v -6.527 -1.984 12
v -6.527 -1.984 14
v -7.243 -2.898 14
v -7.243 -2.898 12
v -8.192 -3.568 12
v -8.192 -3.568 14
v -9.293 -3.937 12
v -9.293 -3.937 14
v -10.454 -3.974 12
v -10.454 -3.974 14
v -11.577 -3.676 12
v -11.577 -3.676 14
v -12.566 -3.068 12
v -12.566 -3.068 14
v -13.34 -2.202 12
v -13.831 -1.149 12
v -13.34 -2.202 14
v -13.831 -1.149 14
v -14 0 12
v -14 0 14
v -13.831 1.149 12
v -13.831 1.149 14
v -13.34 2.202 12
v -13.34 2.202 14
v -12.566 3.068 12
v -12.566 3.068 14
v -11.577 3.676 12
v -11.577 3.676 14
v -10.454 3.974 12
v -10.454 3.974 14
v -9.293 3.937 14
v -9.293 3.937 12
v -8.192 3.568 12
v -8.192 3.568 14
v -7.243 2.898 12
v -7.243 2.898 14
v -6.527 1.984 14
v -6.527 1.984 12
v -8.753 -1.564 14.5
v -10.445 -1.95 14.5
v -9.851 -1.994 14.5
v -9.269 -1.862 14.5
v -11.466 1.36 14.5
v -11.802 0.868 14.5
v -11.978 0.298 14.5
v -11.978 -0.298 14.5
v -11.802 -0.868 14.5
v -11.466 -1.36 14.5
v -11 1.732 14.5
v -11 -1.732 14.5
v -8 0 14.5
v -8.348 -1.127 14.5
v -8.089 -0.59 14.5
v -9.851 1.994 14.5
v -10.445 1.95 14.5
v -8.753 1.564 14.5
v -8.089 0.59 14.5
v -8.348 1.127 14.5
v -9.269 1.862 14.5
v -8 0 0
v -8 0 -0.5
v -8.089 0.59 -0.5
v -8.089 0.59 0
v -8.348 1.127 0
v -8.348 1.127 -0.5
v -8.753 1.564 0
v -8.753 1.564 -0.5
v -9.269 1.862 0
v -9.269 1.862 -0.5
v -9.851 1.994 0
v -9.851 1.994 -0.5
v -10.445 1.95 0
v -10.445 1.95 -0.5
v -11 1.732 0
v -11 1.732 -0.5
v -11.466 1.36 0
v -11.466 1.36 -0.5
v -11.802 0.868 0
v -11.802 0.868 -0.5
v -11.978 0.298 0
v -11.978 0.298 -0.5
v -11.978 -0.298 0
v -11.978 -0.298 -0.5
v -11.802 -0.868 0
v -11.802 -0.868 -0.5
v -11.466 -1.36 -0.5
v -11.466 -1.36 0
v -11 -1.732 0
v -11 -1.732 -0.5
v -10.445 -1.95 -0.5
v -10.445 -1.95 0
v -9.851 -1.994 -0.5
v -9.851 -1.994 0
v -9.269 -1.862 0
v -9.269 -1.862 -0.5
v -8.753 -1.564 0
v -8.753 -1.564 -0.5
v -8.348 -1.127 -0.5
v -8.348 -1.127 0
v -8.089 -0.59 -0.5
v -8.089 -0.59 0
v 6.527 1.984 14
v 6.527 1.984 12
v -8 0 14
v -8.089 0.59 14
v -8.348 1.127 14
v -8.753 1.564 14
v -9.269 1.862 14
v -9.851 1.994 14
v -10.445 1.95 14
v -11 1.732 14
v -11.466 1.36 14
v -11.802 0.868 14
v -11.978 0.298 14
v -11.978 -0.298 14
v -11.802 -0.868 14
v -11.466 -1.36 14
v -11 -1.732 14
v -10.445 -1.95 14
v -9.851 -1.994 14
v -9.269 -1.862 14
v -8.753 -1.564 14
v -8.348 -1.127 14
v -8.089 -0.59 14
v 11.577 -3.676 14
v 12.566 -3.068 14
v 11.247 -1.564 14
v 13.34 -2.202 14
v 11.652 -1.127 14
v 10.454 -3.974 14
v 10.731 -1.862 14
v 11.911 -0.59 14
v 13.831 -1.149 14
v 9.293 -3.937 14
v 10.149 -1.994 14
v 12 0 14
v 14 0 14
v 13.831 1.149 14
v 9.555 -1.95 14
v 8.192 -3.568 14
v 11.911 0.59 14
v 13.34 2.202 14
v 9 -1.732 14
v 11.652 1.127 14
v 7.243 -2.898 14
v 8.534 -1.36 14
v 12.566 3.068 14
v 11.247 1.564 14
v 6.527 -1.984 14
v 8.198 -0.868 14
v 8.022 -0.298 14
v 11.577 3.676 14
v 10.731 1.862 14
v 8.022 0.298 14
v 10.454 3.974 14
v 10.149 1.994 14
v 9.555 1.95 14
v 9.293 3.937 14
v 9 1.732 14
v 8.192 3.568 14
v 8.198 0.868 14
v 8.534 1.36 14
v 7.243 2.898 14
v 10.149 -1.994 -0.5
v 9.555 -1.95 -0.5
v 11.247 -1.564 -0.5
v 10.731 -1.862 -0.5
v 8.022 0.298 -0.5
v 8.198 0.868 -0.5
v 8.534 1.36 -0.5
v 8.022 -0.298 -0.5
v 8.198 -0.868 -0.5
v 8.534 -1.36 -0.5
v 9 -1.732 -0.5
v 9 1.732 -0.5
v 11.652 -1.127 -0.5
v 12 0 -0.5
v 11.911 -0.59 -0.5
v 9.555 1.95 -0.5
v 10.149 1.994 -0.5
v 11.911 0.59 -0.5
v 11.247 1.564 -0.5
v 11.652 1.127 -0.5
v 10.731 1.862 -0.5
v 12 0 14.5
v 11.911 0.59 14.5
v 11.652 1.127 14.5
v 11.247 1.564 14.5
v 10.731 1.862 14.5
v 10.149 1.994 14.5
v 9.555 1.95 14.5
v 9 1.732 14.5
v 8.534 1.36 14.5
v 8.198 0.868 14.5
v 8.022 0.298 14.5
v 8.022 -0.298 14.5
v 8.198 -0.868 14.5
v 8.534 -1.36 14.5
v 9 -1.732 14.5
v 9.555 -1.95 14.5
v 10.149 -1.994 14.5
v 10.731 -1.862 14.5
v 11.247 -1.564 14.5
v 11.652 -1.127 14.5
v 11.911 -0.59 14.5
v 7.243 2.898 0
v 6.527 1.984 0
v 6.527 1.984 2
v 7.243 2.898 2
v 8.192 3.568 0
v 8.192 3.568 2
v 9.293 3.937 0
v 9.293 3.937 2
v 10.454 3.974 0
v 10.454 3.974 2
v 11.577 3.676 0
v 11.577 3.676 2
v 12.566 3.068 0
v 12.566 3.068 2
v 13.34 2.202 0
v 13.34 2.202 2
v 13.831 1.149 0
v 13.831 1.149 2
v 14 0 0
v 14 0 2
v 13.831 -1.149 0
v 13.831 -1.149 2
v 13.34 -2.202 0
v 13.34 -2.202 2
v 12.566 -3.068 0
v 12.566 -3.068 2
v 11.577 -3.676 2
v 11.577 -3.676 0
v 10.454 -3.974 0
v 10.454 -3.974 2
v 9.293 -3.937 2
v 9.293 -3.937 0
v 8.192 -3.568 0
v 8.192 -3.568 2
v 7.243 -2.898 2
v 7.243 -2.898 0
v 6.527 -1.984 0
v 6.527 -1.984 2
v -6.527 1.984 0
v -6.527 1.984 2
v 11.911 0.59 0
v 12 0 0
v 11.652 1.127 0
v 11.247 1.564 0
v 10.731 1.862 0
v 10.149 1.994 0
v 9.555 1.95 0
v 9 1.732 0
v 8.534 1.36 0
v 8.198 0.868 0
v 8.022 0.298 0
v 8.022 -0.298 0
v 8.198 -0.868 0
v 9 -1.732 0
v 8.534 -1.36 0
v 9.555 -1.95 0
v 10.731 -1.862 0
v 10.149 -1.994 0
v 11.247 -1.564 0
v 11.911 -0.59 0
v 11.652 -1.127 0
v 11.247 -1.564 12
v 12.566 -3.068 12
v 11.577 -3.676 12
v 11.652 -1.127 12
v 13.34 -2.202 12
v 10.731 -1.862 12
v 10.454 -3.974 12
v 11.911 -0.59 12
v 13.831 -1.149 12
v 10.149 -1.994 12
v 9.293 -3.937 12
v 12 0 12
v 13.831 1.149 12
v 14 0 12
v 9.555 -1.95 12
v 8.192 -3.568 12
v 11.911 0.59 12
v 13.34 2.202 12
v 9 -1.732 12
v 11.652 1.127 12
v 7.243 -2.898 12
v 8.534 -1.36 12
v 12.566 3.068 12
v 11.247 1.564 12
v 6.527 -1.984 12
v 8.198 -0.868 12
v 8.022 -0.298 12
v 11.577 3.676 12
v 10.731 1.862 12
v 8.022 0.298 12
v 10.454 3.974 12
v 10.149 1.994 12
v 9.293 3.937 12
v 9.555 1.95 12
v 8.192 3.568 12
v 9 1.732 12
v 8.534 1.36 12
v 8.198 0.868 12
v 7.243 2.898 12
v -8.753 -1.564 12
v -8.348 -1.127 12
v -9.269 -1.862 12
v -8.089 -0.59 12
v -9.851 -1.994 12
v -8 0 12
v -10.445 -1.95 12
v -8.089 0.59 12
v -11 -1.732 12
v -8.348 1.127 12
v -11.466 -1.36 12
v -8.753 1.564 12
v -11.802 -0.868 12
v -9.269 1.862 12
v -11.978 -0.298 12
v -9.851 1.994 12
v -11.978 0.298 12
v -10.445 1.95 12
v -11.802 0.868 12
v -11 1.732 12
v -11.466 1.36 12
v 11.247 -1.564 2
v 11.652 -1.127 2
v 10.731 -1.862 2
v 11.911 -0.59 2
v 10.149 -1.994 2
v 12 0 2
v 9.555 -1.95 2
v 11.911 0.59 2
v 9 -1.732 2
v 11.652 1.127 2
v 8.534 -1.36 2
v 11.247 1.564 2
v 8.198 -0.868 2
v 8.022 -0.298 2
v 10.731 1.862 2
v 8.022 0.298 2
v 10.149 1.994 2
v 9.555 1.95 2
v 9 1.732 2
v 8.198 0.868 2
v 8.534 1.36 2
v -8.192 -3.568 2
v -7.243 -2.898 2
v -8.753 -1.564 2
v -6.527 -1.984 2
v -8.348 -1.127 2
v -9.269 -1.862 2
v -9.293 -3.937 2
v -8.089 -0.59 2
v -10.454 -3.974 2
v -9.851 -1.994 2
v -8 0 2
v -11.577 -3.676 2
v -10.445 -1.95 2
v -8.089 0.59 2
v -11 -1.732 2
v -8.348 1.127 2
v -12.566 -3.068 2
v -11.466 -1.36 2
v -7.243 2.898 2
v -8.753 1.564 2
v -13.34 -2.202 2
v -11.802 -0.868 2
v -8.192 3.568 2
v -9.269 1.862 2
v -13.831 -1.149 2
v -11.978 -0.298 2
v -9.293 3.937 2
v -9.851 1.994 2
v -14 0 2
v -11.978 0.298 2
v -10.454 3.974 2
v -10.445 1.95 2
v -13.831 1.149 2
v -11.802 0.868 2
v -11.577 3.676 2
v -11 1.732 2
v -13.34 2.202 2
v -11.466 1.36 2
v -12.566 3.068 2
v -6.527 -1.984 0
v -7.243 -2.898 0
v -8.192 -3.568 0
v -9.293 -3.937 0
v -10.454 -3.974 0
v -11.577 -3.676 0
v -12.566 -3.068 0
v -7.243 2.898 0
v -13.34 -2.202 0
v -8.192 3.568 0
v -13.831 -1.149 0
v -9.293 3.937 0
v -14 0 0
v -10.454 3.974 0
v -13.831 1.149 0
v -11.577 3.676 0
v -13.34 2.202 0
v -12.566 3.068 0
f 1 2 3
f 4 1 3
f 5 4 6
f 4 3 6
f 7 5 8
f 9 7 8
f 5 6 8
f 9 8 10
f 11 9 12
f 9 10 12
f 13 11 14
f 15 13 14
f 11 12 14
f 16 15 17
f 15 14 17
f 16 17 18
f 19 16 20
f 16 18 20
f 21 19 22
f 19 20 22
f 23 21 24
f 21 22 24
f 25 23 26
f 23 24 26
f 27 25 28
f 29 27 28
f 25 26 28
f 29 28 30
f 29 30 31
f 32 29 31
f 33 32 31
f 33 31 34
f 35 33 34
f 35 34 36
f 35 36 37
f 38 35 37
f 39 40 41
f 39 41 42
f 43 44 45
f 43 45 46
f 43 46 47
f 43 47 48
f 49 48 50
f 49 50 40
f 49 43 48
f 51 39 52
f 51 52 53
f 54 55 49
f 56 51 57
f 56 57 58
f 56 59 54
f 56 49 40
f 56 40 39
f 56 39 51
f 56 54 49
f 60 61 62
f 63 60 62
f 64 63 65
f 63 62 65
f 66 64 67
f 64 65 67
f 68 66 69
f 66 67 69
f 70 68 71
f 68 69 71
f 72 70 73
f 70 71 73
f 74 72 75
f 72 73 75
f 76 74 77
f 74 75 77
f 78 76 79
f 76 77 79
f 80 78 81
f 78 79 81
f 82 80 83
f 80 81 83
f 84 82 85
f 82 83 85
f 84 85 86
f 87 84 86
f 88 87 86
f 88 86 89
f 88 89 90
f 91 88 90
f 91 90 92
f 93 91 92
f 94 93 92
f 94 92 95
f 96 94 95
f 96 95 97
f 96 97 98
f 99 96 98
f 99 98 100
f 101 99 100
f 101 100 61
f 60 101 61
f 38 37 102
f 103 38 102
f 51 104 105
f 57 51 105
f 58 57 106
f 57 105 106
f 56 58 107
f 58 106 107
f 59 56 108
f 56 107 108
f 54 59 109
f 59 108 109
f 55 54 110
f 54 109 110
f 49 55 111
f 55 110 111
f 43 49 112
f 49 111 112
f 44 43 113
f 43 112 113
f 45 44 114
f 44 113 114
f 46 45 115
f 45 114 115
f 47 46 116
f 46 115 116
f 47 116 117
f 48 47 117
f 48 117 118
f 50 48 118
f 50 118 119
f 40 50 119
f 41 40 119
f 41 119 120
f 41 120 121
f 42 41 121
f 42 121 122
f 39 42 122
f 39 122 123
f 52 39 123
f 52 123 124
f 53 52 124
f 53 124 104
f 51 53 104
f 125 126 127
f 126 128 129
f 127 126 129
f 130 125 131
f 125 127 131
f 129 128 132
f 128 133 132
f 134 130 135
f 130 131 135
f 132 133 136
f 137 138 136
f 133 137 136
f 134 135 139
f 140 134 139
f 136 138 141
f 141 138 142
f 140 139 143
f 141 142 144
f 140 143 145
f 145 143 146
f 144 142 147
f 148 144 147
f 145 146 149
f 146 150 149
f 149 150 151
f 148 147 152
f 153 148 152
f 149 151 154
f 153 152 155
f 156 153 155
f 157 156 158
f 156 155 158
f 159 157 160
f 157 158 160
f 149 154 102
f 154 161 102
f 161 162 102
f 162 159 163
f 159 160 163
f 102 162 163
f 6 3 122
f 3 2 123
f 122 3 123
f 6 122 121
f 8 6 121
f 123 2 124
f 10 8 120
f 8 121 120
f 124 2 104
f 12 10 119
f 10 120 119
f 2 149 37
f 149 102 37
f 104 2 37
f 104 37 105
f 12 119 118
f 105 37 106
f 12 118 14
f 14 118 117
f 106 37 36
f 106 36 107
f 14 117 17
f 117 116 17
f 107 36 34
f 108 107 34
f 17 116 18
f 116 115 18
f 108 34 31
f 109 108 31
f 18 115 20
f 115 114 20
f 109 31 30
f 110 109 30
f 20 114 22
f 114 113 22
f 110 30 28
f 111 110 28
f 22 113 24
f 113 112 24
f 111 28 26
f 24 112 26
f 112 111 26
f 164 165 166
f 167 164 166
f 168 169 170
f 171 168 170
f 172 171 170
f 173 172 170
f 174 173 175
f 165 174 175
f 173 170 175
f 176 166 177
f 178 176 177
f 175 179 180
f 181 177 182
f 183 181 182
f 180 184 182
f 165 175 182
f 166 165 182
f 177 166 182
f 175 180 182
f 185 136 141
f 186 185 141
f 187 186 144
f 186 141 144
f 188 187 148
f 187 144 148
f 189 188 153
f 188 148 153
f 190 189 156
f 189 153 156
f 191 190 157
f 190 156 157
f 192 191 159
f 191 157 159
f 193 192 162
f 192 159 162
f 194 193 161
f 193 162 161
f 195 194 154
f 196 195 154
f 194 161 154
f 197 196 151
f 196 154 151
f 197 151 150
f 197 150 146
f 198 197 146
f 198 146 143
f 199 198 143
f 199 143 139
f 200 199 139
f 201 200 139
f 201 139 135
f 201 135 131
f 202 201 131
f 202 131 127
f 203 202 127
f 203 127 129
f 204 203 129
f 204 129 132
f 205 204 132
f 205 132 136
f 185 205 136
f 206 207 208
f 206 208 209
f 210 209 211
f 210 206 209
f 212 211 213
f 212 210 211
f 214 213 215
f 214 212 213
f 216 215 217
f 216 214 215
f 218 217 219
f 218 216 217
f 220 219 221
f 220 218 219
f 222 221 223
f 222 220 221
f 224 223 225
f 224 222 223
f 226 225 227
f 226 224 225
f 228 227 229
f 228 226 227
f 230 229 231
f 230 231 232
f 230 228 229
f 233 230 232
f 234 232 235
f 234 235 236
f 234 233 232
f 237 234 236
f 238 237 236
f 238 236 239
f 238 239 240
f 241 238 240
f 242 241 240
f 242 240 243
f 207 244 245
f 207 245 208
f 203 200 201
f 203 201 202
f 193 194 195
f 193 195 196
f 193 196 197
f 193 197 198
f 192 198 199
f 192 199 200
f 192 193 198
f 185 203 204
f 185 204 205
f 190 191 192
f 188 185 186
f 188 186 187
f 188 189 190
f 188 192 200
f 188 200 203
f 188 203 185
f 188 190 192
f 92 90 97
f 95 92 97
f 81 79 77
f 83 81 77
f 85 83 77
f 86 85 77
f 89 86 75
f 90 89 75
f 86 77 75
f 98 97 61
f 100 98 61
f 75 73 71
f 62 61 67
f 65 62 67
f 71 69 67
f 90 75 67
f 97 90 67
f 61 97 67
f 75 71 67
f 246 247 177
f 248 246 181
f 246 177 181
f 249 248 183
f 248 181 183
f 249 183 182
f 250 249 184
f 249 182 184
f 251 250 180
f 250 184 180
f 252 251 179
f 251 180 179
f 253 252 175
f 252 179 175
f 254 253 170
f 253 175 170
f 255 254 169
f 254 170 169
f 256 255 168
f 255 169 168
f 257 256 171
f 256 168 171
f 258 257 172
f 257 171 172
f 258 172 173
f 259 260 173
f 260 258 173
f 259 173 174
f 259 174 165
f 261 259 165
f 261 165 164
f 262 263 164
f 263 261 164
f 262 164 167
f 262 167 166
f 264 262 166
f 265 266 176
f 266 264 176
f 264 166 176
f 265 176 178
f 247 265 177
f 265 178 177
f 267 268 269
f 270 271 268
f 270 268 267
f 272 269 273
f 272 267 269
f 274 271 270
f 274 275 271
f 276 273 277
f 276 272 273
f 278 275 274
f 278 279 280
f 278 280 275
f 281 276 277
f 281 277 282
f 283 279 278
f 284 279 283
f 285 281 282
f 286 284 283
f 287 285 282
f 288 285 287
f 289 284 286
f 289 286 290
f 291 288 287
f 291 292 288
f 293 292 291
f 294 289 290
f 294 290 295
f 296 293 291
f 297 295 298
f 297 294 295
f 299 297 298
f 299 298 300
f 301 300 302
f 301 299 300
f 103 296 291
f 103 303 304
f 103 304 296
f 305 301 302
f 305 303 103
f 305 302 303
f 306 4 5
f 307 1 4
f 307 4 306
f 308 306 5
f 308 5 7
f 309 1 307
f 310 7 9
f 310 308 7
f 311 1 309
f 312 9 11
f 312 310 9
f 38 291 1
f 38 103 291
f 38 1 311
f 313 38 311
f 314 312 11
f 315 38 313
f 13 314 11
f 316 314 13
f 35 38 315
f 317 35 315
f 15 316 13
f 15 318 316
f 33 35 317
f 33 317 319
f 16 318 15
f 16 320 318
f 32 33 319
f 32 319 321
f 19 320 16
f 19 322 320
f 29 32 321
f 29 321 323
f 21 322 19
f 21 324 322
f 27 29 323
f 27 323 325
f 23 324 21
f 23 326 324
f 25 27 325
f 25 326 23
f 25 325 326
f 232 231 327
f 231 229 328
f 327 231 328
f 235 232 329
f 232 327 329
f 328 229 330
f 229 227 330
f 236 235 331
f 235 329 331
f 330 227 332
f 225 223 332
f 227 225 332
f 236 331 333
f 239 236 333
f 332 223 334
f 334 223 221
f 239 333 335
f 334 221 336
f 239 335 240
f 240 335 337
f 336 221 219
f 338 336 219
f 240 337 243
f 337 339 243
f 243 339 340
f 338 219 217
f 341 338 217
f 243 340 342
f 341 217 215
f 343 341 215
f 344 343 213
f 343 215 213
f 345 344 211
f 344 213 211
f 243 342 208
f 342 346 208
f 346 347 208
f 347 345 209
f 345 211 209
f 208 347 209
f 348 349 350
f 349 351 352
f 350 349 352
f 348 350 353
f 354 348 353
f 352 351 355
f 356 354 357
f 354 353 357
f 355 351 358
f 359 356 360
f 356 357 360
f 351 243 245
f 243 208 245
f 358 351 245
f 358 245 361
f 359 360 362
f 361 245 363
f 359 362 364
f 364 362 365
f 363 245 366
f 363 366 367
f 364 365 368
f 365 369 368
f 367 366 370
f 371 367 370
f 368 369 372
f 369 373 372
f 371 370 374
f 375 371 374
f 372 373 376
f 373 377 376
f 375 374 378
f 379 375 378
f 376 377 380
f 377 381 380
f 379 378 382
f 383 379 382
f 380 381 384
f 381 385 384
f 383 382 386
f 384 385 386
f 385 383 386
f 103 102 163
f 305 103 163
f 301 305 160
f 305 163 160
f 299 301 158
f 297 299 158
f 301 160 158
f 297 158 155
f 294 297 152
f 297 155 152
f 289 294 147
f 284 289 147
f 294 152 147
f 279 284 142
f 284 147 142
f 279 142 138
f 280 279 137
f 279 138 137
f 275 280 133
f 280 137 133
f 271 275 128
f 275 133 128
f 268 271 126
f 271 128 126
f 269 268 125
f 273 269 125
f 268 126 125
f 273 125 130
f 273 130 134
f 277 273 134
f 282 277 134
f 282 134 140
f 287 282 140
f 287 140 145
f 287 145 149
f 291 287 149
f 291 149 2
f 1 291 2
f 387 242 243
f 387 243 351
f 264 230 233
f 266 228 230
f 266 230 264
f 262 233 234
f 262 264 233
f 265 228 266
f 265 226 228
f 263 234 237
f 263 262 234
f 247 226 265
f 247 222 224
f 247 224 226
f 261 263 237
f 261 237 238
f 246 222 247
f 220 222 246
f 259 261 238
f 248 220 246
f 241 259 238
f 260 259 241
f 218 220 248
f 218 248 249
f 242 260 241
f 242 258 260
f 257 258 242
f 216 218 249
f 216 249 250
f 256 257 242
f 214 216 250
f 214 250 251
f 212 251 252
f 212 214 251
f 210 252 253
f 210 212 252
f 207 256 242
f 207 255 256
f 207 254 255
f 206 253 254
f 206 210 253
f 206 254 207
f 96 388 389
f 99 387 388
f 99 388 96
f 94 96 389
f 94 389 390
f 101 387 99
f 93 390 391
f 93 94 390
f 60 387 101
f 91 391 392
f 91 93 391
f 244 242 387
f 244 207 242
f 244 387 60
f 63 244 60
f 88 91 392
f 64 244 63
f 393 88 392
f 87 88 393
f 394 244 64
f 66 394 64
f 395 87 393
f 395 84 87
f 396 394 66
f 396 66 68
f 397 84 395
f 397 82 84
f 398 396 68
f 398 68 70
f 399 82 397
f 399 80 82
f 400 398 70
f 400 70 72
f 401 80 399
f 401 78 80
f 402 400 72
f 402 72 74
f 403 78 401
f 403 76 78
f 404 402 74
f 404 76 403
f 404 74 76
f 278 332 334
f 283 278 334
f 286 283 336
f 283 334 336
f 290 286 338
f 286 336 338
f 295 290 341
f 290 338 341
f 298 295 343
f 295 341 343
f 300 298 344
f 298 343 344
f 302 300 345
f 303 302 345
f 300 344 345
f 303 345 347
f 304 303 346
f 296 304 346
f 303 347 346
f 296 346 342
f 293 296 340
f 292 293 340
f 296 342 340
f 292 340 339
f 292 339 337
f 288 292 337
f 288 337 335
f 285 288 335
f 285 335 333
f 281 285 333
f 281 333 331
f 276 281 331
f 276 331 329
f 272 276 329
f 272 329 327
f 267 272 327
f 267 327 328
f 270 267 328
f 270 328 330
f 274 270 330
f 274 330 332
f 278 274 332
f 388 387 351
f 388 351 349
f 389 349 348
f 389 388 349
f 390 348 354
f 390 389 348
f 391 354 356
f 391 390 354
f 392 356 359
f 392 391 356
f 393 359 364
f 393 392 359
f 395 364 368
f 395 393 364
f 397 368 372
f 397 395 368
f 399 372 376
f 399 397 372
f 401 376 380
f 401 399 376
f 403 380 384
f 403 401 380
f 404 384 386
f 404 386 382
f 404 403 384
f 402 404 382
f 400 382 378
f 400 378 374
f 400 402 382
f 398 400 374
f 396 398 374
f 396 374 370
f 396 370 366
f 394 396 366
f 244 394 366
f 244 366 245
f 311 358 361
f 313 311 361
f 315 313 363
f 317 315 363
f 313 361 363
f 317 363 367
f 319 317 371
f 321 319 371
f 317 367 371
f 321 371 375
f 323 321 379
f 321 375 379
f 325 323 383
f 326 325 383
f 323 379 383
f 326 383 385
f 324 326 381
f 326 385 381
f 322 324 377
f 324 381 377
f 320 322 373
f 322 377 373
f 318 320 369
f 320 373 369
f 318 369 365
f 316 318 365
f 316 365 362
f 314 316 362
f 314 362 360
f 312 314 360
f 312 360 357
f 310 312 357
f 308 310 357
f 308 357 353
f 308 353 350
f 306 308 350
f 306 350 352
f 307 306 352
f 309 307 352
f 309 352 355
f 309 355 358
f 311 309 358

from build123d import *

# Parameters (mm, degrees)
SKETCH_1_R           = 2
EXTRUDE_1_DEPTH      = 2
EXTRUDE_2_DEPTH      = 12.5
EXTRUDE_2_DEPTH_BACK = 2.5
SKETCH_2_R           = 2


with BuildPart() as part:
    # 草图1 → 凸台-拉伸1 (new body)
    with BuildSketch(Plane.XY):
        with BuildLine():
            Line((-6.52657961, 1.983771861), (6.52657961, 1.983771861))
            ThreePointArc((6.52657961, 1.983771861), (14, 0), (6.52657961, -1.983771861))
            Line((6.52657961, -1.983771861), (-6.52657961, -1.983771861))
            ThreePointArc((-6.52657961, -1.983771861), (-14, 0), (-6.52657961, 1.983771861))
        make_face()
        with Locations((-10, 0)):
            Circle(SKETCH_1_R, mode=Mode.SUBTRACT)
        with Locations(Location((10, 0, 0), (0, 0, 180))):
            Circle(SKETCH_1_R, mode=Mode.SUBTRACT)
    extrude_1 = extrude(amount=EXTRUDE_1_DEPTH)

    # 草图2 → 凸台-拉伸2 (add, two sides: drawn at the far end of the back side and taken through both)
    with BuildSketch(Plane.XY.offset(2).offset(-EXTRUDE_2_DEPTH_BACK)):
        with Locations((10, 0)):
            Circle(SKETCH_2_R)
        with Locations((-10, 0)):
            Circle(SKETCH_2_R)
    extrude(amount=EXTRUDE_2_DEPTH + EXTRUDE_2_DEPTH_BACK)

    # 镜向1: 凸台-拉伸1 across plane
    add(extrude_1.mirror(Plane.XY.offset(7)))


solid = part.part
